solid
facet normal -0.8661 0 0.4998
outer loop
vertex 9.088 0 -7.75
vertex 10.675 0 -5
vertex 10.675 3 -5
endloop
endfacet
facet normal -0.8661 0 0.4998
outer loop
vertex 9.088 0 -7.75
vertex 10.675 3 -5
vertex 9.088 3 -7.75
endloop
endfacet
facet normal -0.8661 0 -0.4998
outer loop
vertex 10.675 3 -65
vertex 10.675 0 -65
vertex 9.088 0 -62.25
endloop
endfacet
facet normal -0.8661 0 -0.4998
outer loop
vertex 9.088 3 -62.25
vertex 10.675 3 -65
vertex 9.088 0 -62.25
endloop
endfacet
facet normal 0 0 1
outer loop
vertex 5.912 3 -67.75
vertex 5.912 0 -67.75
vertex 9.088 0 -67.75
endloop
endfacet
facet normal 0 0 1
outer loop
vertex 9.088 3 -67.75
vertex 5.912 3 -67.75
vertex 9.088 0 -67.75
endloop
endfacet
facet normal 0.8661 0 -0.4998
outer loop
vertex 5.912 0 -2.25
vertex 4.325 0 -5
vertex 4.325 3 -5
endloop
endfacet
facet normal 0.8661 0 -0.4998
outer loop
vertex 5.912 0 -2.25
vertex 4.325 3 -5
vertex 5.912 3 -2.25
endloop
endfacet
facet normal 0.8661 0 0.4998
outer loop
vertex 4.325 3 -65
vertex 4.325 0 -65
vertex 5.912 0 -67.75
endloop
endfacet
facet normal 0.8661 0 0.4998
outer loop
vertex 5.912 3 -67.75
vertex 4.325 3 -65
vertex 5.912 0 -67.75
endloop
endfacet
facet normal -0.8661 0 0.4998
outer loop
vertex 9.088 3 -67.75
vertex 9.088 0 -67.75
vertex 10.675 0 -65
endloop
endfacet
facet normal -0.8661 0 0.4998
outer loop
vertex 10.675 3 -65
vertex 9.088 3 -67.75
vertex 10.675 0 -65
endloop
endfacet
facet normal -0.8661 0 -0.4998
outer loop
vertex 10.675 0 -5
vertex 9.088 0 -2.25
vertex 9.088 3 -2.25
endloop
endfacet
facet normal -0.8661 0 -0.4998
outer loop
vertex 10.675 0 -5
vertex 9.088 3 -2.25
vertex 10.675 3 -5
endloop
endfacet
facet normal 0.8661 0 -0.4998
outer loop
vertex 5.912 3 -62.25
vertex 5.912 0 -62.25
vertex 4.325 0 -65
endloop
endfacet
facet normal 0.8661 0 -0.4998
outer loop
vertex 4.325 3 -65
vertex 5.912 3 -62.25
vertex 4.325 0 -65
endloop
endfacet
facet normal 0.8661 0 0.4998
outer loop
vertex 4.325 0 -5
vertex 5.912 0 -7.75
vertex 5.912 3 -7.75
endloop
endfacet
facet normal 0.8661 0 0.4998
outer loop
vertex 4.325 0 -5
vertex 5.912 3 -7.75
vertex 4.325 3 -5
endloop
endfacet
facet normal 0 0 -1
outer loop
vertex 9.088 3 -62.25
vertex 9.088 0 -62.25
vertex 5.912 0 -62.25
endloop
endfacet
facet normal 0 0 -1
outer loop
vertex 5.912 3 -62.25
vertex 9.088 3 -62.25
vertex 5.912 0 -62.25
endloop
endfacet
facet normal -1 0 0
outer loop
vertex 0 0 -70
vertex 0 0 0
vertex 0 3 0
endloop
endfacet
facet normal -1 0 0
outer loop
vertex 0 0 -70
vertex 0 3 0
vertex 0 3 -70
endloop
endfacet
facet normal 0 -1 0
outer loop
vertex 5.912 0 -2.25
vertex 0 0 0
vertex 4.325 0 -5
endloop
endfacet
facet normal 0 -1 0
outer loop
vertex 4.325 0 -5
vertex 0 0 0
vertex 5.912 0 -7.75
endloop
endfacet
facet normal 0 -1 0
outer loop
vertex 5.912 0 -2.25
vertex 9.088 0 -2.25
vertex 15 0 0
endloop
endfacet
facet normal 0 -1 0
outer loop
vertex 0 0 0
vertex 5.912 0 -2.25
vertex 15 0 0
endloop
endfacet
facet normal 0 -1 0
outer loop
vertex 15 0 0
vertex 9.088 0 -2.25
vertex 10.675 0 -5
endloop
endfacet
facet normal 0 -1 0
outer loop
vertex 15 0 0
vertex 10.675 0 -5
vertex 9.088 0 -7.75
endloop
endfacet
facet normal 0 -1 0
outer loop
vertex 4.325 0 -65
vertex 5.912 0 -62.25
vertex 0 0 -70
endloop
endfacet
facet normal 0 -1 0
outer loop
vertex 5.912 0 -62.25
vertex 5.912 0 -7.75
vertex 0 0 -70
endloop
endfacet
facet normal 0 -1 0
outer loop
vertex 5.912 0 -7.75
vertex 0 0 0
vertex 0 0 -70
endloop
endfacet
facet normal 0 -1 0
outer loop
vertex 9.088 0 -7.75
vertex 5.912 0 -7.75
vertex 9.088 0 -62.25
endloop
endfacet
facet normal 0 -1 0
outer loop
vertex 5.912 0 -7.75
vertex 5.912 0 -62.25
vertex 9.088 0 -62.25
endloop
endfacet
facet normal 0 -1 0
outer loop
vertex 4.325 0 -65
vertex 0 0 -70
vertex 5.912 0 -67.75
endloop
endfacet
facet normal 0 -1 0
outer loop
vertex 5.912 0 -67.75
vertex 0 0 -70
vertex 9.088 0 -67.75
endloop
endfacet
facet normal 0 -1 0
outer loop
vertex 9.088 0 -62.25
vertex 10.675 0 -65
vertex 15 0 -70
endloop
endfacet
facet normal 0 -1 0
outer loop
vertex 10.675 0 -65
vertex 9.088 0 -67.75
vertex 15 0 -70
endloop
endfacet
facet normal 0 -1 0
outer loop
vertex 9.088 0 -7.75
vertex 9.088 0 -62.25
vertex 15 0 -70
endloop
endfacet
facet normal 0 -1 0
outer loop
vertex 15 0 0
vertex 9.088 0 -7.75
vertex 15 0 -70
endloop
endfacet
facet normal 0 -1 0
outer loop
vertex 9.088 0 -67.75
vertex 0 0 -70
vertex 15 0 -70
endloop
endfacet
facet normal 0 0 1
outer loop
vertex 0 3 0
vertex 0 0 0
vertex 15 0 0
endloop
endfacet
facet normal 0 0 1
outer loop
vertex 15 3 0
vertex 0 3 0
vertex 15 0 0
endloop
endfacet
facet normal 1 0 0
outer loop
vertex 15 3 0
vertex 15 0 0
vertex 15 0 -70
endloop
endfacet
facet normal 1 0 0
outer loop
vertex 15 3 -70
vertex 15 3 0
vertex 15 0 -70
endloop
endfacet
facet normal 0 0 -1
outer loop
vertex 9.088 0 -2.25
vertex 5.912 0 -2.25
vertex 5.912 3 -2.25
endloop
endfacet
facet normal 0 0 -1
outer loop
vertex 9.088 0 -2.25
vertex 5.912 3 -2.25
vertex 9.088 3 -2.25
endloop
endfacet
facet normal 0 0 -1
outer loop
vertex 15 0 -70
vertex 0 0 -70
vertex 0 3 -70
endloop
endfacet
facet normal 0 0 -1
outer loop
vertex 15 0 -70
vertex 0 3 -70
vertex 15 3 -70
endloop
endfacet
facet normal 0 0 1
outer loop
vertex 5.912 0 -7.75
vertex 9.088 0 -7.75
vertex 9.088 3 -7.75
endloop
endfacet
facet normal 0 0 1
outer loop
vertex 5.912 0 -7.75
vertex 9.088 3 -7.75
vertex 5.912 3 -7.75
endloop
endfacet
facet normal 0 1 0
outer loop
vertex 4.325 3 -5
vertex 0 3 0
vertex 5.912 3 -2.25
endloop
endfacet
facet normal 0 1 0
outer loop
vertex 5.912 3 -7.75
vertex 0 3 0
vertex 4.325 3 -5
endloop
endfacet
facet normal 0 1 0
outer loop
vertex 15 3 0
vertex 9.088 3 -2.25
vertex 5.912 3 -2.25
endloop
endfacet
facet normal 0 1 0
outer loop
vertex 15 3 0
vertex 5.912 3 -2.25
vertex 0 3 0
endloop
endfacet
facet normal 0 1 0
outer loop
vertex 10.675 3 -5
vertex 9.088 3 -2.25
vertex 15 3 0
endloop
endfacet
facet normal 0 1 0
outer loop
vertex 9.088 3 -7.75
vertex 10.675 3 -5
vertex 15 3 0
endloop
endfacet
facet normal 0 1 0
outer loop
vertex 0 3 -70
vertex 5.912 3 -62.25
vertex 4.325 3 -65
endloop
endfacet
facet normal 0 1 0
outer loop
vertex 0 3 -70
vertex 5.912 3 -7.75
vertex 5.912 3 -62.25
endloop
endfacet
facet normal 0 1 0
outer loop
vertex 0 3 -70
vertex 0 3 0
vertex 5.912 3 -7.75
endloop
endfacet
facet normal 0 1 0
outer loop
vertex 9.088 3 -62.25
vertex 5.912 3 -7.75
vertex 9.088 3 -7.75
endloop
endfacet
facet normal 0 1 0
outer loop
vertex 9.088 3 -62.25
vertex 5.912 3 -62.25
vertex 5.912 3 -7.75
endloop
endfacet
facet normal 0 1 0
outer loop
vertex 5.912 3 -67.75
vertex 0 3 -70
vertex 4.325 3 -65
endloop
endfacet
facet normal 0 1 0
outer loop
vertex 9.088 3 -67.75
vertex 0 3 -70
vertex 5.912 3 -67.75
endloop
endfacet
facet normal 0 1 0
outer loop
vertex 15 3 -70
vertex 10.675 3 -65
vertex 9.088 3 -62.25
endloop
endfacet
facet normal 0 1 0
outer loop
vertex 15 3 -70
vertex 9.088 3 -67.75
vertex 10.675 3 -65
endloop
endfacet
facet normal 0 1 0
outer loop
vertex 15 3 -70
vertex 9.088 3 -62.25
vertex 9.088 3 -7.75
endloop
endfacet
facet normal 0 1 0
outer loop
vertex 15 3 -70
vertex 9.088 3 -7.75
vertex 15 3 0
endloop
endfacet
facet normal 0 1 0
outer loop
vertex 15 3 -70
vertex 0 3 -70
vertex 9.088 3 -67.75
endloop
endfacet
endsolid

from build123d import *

# Parameters (mm, degrees)
SKETCH1_W           = 15
SKETCH1_H           = 70
BOSS_EXTRUDE1_DEPTH = 3


with BuildPart() as part:
    # Sketch1 → Boss-Extrude1 (new body)
    with BuildSketch(Plane(origin=(0, 0, 0), x_dir=(1, 0, 0), z_dir=(0, 1, 0))):
        with Locations((7.5, 35)):
            Rectangle(SKETCH1_W, SKETCH1_H)
        Polygon((9.08771324, 7.75), (5.91228676, 7.75), (4.324573519, 5), (5.91228676, 2.25), (9.08771324, 2.25), (10.675426481, 5), align=None, mode=Mode.SUBTRACT)
        Polygon((9.08771324, 62.25), (5.91228676, 62.25), (4.324573519, 65), (5.91228676, 67.75), (9.08771324, 67.75), (10.675426481, 65), align=None, mode=Mode.SUBTRACT)
    extrude(amount=BOSS_EXTRUDE1_DEPTH)


solid = part.part
